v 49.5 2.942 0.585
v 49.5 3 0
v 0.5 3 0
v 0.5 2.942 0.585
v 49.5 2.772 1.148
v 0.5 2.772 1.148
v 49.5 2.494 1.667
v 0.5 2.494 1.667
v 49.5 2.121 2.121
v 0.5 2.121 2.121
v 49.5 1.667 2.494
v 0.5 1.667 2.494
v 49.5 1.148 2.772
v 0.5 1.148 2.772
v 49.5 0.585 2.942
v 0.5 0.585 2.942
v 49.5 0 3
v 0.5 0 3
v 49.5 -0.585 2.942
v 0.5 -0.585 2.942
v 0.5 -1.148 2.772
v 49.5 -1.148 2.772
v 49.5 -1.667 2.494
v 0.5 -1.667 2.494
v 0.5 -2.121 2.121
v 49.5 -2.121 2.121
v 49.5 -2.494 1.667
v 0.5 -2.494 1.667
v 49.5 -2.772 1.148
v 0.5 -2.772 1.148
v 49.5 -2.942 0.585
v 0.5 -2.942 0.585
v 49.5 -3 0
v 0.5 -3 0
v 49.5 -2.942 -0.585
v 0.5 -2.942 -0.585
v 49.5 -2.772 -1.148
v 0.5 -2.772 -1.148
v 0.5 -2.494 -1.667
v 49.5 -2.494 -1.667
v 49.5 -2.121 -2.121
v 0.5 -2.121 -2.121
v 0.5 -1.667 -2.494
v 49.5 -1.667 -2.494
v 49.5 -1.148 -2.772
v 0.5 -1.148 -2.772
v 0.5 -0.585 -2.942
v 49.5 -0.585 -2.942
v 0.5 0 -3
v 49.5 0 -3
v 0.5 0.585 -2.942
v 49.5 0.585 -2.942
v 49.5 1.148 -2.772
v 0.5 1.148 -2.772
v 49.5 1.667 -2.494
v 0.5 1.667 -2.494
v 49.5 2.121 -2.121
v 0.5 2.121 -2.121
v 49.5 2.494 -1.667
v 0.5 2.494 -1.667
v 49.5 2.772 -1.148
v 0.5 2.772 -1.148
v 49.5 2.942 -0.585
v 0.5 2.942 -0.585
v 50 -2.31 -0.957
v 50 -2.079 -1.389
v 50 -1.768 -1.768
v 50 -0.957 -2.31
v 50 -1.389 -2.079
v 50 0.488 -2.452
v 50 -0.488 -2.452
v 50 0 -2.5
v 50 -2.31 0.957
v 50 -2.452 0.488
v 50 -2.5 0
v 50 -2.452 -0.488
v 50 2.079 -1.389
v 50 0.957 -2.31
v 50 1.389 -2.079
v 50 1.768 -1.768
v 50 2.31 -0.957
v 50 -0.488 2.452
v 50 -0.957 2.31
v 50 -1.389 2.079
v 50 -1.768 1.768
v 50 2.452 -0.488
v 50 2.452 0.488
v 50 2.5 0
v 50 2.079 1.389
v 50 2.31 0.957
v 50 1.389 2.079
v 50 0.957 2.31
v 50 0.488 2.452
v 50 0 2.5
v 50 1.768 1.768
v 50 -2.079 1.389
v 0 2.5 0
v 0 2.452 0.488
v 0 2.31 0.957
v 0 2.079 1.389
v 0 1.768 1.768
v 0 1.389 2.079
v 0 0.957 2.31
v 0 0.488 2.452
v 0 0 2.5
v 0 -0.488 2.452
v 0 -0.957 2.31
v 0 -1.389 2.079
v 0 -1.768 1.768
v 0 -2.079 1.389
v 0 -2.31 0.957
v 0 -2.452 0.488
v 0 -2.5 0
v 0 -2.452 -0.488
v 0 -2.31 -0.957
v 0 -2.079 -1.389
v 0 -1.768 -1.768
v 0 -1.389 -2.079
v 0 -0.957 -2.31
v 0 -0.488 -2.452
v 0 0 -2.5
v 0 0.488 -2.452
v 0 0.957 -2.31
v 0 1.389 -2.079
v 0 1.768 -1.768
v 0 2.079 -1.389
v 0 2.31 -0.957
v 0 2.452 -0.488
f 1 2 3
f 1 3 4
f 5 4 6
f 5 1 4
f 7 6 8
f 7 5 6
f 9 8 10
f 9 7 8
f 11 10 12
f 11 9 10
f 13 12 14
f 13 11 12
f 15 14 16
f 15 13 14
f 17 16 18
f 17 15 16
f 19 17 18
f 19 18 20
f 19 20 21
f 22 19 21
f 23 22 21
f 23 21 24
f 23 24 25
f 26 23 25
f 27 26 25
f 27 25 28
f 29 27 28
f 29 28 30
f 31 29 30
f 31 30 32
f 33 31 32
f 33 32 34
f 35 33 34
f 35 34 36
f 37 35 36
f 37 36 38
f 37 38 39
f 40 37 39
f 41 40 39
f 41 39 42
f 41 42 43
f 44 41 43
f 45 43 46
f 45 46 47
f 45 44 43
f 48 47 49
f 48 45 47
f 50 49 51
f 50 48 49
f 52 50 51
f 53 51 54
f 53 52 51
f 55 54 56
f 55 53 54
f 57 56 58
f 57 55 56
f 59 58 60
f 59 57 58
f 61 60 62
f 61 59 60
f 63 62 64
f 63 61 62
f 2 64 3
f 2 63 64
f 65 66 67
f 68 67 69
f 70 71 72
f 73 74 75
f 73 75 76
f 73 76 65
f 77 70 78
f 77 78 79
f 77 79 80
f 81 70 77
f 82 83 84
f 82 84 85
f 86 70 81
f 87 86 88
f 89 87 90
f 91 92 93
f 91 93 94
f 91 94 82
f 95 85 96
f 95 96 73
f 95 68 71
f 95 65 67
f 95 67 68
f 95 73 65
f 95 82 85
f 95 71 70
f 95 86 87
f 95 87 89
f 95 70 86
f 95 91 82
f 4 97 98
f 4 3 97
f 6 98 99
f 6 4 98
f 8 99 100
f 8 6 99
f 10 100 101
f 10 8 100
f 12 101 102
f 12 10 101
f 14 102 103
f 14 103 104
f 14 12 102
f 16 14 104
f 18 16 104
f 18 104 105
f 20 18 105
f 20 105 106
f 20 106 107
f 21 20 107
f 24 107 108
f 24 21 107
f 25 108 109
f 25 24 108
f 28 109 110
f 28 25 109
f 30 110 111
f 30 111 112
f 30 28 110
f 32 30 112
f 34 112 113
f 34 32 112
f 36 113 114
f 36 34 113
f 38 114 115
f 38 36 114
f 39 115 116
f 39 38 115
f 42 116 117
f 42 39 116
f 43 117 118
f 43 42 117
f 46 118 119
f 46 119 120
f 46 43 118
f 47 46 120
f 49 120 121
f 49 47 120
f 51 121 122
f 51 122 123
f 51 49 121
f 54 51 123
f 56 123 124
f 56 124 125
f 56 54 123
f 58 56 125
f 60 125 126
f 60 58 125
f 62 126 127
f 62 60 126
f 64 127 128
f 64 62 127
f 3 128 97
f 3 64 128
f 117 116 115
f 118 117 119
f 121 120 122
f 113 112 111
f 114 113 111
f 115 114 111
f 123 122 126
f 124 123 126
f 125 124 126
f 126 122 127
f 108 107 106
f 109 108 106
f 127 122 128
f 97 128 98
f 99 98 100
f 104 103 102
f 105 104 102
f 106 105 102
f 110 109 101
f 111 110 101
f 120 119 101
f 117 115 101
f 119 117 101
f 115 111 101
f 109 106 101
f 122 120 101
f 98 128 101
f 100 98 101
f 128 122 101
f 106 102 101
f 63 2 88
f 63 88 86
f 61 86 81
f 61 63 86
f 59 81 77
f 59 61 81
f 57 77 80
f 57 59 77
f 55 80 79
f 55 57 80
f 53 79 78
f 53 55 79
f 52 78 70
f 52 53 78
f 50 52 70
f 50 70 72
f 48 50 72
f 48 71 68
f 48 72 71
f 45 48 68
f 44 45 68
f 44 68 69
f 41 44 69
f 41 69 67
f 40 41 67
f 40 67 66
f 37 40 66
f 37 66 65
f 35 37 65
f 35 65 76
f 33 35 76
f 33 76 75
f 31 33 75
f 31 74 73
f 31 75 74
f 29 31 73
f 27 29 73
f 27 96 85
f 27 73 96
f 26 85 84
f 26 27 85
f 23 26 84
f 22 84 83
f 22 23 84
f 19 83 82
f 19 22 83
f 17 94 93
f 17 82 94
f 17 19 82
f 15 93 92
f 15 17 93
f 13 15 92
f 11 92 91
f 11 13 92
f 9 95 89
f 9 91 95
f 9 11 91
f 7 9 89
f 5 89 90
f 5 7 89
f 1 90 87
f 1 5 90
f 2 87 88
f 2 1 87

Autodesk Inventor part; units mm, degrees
ref_plane "Startebene" through (0, 0, 0) normal (1, 0, 0) x (0, 1, 0)
ref_plane "XZ Plane" through (0, 0, 0) normal (0, 1, 0) x (-1, 0, 0)
ref_plane "XY Plane" through (0, 0, 0) normal (0, 0, 1) x (1, 0, 0)
sketch "Hauptskizze" plane through (0, 0, 0) normal (0, 0, 1) x (1, 0, 0)
  line L0 (0, 0) -> (50, 0)
  line L1 (0, 0) -> (0, 3)
  line L2 (50, 3) -> (50, 0)
  line L3 (0, 3) -> (50, 3)
  dimension "d3" = 6
revolve "Umdrehung1" add sketch "Hauptskizze" angle 360 about axis through (0, 0, 0) along (1, 0, 0)
chamfer "Fase3" distance 0.5 angle 45 1 edges at (0, -3, 0) measured on face at (33.3333, 2.9612, -0.4812)
chamfer "Fase2" distance 0.5 angle 45 1 edges at (50, -3, 0) measured on face at (17, 2.9903, -0.2414)
properties part number "Welle" material "Steel"
